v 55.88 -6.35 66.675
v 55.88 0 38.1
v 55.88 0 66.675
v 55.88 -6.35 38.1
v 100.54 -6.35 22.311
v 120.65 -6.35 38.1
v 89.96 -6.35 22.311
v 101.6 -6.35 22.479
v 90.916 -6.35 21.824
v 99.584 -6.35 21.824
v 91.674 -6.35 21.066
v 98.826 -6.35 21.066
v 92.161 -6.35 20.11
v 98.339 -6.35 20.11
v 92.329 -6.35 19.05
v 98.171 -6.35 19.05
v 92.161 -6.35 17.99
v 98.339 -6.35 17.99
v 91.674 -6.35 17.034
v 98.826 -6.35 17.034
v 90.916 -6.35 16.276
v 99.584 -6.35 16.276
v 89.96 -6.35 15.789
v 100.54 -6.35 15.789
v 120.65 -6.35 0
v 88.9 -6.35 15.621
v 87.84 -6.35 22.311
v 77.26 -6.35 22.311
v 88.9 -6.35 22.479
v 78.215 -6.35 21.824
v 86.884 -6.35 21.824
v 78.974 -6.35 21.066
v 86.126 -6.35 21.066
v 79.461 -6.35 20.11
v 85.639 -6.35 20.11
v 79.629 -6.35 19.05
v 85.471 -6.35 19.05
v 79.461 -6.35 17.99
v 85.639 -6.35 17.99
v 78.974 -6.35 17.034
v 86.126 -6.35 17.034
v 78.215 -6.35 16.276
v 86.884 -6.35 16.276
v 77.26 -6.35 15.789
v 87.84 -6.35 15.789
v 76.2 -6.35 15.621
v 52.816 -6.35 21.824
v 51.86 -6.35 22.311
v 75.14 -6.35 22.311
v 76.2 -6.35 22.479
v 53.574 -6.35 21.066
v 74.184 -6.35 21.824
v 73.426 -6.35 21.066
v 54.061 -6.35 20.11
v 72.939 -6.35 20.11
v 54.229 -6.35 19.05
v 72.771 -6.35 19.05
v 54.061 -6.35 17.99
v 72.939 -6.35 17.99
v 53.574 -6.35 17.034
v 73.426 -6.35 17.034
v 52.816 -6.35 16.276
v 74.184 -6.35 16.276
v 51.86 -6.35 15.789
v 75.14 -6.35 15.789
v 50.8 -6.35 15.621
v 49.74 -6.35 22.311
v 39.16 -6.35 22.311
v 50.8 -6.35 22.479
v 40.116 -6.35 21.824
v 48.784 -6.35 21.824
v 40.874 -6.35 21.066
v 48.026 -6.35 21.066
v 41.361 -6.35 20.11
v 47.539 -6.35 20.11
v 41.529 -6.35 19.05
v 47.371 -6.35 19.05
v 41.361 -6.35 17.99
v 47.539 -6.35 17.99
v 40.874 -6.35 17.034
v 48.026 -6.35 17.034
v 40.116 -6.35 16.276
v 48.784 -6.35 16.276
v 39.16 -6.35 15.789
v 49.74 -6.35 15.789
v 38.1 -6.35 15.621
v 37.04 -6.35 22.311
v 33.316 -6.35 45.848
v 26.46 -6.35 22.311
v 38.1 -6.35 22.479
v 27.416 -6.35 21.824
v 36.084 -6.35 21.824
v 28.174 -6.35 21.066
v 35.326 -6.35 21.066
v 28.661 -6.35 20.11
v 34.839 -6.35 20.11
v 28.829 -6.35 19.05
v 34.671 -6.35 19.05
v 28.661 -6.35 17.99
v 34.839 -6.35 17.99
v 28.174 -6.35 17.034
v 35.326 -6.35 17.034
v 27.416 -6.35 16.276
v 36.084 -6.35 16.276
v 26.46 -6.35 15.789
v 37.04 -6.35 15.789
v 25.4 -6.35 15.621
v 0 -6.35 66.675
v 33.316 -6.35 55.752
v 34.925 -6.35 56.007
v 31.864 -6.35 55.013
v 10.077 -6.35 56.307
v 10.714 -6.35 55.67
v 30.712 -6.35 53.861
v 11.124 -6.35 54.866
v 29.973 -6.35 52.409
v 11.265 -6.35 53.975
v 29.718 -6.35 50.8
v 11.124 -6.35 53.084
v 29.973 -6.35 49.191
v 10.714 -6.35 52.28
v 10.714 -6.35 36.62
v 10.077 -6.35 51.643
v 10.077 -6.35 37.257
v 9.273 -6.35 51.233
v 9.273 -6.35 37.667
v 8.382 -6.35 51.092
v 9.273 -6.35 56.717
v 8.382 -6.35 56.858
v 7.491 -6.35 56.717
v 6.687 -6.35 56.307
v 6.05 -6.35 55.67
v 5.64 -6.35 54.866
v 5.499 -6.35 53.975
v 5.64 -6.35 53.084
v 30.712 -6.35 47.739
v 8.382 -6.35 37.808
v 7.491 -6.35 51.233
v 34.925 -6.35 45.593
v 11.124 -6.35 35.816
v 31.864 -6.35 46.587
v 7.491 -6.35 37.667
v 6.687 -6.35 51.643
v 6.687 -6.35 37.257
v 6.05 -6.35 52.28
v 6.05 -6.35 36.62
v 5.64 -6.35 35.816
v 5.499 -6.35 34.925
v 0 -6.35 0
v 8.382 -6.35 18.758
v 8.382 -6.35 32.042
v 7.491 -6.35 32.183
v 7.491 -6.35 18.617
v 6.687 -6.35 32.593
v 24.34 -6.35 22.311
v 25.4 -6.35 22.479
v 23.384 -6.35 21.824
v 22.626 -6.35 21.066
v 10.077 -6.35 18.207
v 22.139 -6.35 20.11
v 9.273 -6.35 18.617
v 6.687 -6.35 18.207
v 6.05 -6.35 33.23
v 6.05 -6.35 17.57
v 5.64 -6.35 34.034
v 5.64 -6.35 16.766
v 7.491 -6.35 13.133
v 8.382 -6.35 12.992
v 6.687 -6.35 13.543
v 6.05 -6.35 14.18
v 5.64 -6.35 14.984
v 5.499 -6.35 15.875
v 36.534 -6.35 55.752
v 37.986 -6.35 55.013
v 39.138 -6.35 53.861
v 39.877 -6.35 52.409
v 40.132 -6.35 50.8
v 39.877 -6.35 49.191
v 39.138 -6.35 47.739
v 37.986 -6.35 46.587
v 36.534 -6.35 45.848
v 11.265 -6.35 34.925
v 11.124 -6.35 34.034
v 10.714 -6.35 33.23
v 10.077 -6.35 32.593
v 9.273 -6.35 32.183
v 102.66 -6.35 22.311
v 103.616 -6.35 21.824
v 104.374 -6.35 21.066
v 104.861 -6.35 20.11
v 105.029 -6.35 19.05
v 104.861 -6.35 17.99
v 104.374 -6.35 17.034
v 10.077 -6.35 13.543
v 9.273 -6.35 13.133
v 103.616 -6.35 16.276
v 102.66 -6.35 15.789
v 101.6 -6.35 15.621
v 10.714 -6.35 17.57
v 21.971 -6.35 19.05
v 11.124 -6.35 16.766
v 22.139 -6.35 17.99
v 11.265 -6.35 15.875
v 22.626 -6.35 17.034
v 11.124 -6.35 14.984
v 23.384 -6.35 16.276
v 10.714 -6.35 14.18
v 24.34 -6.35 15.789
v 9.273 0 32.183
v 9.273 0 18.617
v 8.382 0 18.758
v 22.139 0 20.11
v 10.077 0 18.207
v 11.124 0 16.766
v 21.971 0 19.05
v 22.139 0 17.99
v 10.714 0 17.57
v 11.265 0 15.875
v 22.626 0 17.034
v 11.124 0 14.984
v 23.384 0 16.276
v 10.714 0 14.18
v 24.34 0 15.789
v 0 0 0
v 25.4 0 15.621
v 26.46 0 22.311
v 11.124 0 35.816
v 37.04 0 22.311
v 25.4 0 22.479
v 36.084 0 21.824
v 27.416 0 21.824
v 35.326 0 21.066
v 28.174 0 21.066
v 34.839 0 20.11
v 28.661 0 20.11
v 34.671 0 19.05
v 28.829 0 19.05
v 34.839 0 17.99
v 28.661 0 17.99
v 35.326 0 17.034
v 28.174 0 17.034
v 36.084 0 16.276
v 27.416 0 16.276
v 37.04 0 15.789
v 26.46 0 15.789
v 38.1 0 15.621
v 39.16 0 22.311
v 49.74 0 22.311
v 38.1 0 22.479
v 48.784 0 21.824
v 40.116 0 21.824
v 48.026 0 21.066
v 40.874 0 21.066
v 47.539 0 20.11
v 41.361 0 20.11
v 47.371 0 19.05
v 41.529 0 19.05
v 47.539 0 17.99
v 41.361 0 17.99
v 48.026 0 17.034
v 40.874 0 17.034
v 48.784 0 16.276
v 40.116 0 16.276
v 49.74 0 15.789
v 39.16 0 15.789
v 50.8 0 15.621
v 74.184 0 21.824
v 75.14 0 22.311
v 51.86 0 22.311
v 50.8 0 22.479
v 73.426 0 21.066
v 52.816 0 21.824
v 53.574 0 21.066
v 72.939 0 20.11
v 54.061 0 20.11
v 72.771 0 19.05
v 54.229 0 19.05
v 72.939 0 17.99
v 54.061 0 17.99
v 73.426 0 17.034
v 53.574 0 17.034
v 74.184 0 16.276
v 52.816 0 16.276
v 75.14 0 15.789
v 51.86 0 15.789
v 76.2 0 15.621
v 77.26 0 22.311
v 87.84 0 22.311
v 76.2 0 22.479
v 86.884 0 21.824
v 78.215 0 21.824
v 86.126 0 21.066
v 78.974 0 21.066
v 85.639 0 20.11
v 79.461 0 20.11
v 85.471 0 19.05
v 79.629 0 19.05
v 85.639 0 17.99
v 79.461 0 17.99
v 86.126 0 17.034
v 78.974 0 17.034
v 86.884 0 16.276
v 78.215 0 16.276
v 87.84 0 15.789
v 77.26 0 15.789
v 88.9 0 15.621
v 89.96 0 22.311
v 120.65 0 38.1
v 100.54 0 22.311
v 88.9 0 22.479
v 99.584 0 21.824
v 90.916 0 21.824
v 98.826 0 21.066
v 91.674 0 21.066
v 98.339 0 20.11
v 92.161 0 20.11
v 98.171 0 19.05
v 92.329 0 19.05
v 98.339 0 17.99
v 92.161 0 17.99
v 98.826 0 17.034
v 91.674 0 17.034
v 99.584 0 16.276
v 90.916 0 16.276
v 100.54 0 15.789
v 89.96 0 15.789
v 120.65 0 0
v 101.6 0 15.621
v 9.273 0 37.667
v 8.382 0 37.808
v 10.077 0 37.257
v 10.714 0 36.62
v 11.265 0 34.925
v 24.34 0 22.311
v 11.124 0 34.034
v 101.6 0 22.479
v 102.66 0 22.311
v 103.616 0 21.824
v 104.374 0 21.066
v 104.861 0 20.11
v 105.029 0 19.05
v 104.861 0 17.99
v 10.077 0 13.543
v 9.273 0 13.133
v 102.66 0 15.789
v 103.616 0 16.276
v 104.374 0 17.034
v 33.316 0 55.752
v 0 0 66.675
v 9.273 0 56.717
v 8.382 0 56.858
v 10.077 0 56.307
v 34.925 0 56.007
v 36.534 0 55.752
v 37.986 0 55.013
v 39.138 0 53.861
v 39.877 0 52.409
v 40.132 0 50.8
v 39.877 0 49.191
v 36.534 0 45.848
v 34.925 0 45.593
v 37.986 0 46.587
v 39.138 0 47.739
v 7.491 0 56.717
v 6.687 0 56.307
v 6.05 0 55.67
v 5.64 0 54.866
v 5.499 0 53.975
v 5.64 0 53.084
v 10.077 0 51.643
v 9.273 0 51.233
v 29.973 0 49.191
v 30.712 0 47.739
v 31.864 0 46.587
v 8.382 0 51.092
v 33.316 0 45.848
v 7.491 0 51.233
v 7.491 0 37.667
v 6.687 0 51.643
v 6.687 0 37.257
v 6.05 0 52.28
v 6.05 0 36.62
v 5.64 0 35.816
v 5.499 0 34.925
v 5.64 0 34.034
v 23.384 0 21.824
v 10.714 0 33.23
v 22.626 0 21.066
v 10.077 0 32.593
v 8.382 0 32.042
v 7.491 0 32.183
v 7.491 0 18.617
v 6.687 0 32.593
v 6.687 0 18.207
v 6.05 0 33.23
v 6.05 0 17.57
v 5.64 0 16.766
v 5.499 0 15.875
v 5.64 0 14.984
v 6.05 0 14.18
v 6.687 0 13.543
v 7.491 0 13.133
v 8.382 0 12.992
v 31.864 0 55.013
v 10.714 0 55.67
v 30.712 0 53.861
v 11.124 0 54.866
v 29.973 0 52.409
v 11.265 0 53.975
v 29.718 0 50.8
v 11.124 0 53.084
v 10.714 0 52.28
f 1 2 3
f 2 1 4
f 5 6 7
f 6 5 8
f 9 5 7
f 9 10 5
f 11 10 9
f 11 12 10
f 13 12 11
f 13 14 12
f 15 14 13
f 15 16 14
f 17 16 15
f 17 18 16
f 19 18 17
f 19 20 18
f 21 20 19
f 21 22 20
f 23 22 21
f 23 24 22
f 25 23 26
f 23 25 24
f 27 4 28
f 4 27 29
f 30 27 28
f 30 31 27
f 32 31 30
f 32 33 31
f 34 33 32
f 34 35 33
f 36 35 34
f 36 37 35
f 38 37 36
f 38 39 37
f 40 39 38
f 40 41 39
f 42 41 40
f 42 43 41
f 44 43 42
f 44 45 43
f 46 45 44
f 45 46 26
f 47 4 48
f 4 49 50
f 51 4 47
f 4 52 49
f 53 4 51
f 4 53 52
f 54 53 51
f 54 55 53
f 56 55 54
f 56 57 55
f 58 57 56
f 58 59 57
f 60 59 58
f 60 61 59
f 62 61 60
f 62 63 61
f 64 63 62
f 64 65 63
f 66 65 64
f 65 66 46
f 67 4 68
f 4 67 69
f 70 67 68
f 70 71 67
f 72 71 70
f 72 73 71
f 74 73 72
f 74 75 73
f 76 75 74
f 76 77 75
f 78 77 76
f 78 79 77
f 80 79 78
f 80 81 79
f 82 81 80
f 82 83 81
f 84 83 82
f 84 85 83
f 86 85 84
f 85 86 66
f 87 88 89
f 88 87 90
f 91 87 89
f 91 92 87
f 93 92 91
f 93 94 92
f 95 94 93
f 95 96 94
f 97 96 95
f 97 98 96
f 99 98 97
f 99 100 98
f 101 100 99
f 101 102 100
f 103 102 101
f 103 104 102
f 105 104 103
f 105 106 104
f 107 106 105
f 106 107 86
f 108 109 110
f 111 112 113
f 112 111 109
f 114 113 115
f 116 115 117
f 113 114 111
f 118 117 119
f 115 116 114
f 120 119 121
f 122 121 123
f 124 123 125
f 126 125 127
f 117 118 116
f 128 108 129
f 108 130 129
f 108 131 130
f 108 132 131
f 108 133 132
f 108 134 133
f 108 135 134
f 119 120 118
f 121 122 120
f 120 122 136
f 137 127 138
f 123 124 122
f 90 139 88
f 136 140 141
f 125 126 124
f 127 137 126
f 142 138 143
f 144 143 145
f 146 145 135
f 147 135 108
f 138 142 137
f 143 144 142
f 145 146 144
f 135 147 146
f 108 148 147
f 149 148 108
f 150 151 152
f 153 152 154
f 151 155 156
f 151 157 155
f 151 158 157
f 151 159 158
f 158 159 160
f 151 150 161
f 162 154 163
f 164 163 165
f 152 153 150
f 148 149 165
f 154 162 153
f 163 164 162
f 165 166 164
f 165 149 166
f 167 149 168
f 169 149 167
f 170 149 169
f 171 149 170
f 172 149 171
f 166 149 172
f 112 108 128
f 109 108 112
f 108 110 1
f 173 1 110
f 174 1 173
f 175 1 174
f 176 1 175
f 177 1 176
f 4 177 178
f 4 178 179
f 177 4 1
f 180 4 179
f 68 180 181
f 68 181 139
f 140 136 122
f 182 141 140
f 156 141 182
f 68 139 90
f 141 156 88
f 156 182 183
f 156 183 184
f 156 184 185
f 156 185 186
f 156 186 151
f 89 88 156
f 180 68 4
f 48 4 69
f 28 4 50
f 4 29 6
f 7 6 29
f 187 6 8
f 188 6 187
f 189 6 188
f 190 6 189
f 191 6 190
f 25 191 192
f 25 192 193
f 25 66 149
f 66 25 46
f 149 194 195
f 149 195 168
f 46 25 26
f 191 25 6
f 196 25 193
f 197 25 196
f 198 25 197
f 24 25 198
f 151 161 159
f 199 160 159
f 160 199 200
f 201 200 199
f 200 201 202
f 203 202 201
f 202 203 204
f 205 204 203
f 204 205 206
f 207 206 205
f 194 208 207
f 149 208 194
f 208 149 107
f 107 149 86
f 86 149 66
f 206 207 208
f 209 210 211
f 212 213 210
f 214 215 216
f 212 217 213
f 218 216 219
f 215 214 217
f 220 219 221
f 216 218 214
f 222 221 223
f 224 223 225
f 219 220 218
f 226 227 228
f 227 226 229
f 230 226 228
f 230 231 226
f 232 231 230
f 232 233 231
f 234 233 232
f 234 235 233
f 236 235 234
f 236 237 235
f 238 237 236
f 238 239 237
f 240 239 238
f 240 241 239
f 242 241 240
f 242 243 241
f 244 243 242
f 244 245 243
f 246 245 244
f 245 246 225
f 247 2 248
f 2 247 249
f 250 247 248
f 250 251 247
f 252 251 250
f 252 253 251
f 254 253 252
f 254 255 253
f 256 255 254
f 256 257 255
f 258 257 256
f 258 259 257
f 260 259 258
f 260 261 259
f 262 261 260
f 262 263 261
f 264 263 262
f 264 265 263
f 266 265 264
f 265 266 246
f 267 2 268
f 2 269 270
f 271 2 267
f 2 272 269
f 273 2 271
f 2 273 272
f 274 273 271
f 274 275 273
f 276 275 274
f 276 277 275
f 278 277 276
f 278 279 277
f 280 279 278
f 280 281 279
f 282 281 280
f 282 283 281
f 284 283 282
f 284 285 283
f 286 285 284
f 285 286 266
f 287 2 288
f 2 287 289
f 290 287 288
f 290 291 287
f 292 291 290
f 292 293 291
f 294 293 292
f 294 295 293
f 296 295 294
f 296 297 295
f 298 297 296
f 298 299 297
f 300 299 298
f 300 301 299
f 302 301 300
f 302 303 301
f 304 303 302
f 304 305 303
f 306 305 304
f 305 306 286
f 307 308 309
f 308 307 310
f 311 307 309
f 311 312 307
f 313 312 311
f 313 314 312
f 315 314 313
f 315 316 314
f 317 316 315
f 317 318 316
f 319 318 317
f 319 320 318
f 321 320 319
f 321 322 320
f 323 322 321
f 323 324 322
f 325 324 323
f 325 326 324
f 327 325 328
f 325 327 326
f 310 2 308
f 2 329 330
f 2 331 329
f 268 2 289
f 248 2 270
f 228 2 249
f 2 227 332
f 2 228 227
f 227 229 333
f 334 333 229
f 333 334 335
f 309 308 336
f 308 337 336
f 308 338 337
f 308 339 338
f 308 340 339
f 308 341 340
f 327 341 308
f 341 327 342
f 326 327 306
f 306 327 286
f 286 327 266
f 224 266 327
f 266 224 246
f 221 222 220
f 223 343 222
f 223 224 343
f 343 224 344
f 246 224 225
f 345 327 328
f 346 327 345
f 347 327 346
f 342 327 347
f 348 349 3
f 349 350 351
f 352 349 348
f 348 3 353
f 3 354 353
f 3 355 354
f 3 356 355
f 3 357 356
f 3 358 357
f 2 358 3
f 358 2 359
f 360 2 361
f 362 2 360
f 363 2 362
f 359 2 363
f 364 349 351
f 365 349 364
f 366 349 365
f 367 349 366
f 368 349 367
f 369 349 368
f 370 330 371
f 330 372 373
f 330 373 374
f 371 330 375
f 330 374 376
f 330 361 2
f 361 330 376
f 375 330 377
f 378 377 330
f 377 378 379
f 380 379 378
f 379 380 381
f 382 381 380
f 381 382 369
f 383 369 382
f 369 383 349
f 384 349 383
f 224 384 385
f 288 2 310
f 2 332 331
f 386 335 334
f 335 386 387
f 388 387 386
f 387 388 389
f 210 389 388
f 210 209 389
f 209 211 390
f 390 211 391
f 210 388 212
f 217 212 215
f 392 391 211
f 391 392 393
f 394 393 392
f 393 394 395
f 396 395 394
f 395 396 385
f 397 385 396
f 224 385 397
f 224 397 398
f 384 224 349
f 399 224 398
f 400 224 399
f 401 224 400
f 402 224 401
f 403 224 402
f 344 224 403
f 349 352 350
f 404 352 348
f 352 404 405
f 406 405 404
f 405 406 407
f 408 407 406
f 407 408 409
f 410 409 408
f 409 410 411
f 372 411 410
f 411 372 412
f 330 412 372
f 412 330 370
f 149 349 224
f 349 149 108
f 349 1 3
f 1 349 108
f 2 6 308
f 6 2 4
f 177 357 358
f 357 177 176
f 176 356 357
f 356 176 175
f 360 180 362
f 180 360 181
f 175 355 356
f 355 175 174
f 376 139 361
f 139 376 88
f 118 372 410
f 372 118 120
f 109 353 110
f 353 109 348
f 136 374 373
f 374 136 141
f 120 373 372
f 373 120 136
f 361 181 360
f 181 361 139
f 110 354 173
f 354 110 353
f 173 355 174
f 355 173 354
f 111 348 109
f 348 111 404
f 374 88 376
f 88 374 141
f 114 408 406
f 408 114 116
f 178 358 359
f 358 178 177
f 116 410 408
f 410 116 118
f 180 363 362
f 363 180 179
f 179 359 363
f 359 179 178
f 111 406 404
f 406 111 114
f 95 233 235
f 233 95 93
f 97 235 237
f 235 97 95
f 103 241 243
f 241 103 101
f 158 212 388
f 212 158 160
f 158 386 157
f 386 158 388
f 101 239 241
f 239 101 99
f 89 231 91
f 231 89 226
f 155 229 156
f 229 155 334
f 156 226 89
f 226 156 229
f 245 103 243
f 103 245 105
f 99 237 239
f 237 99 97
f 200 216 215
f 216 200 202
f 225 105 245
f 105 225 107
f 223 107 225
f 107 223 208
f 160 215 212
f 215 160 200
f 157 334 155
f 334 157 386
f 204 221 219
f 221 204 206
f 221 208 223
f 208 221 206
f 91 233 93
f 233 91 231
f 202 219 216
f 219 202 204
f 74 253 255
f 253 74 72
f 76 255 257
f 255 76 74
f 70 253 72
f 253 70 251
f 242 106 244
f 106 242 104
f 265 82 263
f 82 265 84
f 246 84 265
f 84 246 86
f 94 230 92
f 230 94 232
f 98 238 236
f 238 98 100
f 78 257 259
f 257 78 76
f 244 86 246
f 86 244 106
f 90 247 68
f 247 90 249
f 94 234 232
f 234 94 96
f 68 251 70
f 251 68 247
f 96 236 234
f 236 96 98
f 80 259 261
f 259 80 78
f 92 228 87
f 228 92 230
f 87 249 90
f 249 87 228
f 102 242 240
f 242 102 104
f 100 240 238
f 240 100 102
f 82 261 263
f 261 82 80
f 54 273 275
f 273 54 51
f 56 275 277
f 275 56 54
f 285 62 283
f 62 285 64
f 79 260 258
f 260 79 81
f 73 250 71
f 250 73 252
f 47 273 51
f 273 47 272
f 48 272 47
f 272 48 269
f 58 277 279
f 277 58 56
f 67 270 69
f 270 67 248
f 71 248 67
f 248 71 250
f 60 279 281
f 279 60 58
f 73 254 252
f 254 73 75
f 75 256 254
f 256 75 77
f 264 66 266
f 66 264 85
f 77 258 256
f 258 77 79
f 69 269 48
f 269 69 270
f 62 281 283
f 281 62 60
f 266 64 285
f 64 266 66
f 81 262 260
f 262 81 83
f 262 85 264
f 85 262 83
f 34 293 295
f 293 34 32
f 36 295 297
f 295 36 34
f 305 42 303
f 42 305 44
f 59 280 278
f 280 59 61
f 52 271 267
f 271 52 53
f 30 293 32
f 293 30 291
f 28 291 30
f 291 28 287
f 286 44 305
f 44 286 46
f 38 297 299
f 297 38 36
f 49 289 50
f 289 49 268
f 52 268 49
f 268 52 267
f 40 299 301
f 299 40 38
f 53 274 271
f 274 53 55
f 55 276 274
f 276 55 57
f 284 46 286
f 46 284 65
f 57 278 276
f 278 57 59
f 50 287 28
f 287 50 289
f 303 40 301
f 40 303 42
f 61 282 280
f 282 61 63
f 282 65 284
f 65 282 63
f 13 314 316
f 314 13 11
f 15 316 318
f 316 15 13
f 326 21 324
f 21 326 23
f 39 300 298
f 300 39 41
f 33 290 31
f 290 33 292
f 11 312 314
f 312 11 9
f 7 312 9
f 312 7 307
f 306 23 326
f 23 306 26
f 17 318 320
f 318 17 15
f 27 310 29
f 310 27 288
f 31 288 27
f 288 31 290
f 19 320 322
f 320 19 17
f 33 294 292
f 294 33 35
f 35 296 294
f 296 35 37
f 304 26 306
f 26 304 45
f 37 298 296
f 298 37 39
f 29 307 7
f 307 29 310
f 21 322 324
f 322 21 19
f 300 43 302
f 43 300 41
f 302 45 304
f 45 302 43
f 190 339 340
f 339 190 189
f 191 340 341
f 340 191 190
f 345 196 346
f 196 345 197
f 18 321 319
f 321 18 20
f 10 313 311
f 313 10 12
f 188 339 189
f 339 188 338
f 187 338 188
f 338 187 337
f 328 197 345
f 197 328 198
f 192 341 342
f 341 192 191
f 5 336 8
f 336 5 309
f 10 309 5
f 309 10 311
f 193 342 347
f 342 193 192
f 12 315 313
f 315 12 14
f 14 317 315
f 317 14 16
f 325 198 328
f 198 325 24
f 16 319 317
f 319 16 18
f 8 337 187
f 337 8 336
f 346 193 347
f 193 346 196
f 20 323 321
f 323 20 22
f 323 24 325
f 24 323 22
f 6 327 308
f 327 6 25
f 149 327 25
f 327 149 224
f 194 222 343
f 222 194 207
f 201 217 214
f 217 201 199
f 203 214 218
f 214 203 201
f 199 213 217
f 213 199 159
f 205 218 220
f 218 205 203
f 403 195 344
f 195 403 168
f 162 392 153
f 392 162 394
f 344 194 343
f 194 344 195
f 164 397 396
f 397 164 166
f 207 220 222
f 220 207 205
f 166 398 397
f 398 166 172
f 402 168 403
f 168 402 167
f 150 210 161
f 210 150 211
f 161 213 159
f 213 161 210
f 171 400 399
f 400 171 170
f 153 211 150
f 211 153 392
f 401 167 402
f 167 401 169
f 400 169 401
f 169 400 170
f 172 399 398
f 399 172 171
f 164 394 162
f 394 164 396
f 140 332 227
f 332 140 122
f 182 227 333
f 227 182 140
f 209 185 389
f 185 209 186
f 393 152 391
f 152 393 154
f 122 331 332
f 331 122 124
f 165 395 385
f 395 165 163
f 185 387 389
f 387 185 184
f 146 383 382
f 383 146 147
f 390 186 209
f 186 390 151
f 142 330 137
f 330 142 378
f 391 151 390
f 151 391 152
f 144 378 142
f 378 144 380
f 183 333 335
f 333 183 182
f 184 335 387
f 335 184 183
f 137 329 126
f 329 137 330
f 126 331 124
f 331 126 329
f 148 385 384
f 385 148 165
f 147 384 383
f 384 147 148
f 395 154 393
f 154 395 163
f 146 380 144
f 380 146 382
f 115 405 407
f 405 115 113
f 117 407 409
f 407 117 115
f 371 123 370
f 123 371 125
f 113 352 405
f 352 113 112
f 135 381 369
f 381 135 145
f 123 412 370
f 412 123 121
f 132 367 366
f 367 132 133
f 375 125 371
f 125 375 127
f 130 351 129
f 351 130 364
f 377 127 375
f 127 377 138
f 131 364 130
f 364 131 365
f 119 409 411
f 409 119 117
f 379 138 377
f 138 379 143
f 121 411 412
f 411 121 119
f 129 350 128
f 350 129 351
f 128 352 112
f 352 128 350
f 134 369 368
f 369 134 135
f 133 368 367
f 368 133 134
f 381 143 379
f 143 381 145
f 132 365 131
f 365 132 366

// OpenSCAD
// in inches
pl_x=2.2;
pl_y=1.125;
pl_z=2/8;

pl2_x=4+6/8;
pl2_y=1+1/2;


bnc_r=(0.40+0.01)/2;
sw_r=(0.25+0.02)/2;
rackh_r=(0.187+0.04)/2;

//convert to mm
scale([25.4, 25.4, 25.4]) {
//scale([1,1,1]) {

rotate([90,0,0]){

difference(){
union(){
translate([0,1.5,0])
difference(){
cube([pl_x,pl_y,pl_z]);
translate([1+3/8,0.5,-1]){cylinder(h=2,r=bnc_r,$fn=20);}
}

difference(){
cube([pl2_x,pl2_y,pl_z]);
translate([1.5,1.75,0])
union(){
for(i=[1:3]){translate([i/2-1,-1,-1]){cylinder(h=2, r=sw_r,$fn=20);}}
for(i=[1:3]){translate([i/2-1+2,-1,-1]){cylinder(h=2, r=sw_r,$fn=20);}}
}
}
}

translate([0.33,5/8,0])
union(){
translate([0,0,-1]){cylinder(h=2, r=rackh_r,$fn=20);}
translate([0,6/8,-1]){cylinder(h=2, r=rackh_r,$fn=20);}
translate([0,(2*6)/8,-1]){cylinder(h=2, r=rackh_r,$fn=20);}
}
}

}
}
